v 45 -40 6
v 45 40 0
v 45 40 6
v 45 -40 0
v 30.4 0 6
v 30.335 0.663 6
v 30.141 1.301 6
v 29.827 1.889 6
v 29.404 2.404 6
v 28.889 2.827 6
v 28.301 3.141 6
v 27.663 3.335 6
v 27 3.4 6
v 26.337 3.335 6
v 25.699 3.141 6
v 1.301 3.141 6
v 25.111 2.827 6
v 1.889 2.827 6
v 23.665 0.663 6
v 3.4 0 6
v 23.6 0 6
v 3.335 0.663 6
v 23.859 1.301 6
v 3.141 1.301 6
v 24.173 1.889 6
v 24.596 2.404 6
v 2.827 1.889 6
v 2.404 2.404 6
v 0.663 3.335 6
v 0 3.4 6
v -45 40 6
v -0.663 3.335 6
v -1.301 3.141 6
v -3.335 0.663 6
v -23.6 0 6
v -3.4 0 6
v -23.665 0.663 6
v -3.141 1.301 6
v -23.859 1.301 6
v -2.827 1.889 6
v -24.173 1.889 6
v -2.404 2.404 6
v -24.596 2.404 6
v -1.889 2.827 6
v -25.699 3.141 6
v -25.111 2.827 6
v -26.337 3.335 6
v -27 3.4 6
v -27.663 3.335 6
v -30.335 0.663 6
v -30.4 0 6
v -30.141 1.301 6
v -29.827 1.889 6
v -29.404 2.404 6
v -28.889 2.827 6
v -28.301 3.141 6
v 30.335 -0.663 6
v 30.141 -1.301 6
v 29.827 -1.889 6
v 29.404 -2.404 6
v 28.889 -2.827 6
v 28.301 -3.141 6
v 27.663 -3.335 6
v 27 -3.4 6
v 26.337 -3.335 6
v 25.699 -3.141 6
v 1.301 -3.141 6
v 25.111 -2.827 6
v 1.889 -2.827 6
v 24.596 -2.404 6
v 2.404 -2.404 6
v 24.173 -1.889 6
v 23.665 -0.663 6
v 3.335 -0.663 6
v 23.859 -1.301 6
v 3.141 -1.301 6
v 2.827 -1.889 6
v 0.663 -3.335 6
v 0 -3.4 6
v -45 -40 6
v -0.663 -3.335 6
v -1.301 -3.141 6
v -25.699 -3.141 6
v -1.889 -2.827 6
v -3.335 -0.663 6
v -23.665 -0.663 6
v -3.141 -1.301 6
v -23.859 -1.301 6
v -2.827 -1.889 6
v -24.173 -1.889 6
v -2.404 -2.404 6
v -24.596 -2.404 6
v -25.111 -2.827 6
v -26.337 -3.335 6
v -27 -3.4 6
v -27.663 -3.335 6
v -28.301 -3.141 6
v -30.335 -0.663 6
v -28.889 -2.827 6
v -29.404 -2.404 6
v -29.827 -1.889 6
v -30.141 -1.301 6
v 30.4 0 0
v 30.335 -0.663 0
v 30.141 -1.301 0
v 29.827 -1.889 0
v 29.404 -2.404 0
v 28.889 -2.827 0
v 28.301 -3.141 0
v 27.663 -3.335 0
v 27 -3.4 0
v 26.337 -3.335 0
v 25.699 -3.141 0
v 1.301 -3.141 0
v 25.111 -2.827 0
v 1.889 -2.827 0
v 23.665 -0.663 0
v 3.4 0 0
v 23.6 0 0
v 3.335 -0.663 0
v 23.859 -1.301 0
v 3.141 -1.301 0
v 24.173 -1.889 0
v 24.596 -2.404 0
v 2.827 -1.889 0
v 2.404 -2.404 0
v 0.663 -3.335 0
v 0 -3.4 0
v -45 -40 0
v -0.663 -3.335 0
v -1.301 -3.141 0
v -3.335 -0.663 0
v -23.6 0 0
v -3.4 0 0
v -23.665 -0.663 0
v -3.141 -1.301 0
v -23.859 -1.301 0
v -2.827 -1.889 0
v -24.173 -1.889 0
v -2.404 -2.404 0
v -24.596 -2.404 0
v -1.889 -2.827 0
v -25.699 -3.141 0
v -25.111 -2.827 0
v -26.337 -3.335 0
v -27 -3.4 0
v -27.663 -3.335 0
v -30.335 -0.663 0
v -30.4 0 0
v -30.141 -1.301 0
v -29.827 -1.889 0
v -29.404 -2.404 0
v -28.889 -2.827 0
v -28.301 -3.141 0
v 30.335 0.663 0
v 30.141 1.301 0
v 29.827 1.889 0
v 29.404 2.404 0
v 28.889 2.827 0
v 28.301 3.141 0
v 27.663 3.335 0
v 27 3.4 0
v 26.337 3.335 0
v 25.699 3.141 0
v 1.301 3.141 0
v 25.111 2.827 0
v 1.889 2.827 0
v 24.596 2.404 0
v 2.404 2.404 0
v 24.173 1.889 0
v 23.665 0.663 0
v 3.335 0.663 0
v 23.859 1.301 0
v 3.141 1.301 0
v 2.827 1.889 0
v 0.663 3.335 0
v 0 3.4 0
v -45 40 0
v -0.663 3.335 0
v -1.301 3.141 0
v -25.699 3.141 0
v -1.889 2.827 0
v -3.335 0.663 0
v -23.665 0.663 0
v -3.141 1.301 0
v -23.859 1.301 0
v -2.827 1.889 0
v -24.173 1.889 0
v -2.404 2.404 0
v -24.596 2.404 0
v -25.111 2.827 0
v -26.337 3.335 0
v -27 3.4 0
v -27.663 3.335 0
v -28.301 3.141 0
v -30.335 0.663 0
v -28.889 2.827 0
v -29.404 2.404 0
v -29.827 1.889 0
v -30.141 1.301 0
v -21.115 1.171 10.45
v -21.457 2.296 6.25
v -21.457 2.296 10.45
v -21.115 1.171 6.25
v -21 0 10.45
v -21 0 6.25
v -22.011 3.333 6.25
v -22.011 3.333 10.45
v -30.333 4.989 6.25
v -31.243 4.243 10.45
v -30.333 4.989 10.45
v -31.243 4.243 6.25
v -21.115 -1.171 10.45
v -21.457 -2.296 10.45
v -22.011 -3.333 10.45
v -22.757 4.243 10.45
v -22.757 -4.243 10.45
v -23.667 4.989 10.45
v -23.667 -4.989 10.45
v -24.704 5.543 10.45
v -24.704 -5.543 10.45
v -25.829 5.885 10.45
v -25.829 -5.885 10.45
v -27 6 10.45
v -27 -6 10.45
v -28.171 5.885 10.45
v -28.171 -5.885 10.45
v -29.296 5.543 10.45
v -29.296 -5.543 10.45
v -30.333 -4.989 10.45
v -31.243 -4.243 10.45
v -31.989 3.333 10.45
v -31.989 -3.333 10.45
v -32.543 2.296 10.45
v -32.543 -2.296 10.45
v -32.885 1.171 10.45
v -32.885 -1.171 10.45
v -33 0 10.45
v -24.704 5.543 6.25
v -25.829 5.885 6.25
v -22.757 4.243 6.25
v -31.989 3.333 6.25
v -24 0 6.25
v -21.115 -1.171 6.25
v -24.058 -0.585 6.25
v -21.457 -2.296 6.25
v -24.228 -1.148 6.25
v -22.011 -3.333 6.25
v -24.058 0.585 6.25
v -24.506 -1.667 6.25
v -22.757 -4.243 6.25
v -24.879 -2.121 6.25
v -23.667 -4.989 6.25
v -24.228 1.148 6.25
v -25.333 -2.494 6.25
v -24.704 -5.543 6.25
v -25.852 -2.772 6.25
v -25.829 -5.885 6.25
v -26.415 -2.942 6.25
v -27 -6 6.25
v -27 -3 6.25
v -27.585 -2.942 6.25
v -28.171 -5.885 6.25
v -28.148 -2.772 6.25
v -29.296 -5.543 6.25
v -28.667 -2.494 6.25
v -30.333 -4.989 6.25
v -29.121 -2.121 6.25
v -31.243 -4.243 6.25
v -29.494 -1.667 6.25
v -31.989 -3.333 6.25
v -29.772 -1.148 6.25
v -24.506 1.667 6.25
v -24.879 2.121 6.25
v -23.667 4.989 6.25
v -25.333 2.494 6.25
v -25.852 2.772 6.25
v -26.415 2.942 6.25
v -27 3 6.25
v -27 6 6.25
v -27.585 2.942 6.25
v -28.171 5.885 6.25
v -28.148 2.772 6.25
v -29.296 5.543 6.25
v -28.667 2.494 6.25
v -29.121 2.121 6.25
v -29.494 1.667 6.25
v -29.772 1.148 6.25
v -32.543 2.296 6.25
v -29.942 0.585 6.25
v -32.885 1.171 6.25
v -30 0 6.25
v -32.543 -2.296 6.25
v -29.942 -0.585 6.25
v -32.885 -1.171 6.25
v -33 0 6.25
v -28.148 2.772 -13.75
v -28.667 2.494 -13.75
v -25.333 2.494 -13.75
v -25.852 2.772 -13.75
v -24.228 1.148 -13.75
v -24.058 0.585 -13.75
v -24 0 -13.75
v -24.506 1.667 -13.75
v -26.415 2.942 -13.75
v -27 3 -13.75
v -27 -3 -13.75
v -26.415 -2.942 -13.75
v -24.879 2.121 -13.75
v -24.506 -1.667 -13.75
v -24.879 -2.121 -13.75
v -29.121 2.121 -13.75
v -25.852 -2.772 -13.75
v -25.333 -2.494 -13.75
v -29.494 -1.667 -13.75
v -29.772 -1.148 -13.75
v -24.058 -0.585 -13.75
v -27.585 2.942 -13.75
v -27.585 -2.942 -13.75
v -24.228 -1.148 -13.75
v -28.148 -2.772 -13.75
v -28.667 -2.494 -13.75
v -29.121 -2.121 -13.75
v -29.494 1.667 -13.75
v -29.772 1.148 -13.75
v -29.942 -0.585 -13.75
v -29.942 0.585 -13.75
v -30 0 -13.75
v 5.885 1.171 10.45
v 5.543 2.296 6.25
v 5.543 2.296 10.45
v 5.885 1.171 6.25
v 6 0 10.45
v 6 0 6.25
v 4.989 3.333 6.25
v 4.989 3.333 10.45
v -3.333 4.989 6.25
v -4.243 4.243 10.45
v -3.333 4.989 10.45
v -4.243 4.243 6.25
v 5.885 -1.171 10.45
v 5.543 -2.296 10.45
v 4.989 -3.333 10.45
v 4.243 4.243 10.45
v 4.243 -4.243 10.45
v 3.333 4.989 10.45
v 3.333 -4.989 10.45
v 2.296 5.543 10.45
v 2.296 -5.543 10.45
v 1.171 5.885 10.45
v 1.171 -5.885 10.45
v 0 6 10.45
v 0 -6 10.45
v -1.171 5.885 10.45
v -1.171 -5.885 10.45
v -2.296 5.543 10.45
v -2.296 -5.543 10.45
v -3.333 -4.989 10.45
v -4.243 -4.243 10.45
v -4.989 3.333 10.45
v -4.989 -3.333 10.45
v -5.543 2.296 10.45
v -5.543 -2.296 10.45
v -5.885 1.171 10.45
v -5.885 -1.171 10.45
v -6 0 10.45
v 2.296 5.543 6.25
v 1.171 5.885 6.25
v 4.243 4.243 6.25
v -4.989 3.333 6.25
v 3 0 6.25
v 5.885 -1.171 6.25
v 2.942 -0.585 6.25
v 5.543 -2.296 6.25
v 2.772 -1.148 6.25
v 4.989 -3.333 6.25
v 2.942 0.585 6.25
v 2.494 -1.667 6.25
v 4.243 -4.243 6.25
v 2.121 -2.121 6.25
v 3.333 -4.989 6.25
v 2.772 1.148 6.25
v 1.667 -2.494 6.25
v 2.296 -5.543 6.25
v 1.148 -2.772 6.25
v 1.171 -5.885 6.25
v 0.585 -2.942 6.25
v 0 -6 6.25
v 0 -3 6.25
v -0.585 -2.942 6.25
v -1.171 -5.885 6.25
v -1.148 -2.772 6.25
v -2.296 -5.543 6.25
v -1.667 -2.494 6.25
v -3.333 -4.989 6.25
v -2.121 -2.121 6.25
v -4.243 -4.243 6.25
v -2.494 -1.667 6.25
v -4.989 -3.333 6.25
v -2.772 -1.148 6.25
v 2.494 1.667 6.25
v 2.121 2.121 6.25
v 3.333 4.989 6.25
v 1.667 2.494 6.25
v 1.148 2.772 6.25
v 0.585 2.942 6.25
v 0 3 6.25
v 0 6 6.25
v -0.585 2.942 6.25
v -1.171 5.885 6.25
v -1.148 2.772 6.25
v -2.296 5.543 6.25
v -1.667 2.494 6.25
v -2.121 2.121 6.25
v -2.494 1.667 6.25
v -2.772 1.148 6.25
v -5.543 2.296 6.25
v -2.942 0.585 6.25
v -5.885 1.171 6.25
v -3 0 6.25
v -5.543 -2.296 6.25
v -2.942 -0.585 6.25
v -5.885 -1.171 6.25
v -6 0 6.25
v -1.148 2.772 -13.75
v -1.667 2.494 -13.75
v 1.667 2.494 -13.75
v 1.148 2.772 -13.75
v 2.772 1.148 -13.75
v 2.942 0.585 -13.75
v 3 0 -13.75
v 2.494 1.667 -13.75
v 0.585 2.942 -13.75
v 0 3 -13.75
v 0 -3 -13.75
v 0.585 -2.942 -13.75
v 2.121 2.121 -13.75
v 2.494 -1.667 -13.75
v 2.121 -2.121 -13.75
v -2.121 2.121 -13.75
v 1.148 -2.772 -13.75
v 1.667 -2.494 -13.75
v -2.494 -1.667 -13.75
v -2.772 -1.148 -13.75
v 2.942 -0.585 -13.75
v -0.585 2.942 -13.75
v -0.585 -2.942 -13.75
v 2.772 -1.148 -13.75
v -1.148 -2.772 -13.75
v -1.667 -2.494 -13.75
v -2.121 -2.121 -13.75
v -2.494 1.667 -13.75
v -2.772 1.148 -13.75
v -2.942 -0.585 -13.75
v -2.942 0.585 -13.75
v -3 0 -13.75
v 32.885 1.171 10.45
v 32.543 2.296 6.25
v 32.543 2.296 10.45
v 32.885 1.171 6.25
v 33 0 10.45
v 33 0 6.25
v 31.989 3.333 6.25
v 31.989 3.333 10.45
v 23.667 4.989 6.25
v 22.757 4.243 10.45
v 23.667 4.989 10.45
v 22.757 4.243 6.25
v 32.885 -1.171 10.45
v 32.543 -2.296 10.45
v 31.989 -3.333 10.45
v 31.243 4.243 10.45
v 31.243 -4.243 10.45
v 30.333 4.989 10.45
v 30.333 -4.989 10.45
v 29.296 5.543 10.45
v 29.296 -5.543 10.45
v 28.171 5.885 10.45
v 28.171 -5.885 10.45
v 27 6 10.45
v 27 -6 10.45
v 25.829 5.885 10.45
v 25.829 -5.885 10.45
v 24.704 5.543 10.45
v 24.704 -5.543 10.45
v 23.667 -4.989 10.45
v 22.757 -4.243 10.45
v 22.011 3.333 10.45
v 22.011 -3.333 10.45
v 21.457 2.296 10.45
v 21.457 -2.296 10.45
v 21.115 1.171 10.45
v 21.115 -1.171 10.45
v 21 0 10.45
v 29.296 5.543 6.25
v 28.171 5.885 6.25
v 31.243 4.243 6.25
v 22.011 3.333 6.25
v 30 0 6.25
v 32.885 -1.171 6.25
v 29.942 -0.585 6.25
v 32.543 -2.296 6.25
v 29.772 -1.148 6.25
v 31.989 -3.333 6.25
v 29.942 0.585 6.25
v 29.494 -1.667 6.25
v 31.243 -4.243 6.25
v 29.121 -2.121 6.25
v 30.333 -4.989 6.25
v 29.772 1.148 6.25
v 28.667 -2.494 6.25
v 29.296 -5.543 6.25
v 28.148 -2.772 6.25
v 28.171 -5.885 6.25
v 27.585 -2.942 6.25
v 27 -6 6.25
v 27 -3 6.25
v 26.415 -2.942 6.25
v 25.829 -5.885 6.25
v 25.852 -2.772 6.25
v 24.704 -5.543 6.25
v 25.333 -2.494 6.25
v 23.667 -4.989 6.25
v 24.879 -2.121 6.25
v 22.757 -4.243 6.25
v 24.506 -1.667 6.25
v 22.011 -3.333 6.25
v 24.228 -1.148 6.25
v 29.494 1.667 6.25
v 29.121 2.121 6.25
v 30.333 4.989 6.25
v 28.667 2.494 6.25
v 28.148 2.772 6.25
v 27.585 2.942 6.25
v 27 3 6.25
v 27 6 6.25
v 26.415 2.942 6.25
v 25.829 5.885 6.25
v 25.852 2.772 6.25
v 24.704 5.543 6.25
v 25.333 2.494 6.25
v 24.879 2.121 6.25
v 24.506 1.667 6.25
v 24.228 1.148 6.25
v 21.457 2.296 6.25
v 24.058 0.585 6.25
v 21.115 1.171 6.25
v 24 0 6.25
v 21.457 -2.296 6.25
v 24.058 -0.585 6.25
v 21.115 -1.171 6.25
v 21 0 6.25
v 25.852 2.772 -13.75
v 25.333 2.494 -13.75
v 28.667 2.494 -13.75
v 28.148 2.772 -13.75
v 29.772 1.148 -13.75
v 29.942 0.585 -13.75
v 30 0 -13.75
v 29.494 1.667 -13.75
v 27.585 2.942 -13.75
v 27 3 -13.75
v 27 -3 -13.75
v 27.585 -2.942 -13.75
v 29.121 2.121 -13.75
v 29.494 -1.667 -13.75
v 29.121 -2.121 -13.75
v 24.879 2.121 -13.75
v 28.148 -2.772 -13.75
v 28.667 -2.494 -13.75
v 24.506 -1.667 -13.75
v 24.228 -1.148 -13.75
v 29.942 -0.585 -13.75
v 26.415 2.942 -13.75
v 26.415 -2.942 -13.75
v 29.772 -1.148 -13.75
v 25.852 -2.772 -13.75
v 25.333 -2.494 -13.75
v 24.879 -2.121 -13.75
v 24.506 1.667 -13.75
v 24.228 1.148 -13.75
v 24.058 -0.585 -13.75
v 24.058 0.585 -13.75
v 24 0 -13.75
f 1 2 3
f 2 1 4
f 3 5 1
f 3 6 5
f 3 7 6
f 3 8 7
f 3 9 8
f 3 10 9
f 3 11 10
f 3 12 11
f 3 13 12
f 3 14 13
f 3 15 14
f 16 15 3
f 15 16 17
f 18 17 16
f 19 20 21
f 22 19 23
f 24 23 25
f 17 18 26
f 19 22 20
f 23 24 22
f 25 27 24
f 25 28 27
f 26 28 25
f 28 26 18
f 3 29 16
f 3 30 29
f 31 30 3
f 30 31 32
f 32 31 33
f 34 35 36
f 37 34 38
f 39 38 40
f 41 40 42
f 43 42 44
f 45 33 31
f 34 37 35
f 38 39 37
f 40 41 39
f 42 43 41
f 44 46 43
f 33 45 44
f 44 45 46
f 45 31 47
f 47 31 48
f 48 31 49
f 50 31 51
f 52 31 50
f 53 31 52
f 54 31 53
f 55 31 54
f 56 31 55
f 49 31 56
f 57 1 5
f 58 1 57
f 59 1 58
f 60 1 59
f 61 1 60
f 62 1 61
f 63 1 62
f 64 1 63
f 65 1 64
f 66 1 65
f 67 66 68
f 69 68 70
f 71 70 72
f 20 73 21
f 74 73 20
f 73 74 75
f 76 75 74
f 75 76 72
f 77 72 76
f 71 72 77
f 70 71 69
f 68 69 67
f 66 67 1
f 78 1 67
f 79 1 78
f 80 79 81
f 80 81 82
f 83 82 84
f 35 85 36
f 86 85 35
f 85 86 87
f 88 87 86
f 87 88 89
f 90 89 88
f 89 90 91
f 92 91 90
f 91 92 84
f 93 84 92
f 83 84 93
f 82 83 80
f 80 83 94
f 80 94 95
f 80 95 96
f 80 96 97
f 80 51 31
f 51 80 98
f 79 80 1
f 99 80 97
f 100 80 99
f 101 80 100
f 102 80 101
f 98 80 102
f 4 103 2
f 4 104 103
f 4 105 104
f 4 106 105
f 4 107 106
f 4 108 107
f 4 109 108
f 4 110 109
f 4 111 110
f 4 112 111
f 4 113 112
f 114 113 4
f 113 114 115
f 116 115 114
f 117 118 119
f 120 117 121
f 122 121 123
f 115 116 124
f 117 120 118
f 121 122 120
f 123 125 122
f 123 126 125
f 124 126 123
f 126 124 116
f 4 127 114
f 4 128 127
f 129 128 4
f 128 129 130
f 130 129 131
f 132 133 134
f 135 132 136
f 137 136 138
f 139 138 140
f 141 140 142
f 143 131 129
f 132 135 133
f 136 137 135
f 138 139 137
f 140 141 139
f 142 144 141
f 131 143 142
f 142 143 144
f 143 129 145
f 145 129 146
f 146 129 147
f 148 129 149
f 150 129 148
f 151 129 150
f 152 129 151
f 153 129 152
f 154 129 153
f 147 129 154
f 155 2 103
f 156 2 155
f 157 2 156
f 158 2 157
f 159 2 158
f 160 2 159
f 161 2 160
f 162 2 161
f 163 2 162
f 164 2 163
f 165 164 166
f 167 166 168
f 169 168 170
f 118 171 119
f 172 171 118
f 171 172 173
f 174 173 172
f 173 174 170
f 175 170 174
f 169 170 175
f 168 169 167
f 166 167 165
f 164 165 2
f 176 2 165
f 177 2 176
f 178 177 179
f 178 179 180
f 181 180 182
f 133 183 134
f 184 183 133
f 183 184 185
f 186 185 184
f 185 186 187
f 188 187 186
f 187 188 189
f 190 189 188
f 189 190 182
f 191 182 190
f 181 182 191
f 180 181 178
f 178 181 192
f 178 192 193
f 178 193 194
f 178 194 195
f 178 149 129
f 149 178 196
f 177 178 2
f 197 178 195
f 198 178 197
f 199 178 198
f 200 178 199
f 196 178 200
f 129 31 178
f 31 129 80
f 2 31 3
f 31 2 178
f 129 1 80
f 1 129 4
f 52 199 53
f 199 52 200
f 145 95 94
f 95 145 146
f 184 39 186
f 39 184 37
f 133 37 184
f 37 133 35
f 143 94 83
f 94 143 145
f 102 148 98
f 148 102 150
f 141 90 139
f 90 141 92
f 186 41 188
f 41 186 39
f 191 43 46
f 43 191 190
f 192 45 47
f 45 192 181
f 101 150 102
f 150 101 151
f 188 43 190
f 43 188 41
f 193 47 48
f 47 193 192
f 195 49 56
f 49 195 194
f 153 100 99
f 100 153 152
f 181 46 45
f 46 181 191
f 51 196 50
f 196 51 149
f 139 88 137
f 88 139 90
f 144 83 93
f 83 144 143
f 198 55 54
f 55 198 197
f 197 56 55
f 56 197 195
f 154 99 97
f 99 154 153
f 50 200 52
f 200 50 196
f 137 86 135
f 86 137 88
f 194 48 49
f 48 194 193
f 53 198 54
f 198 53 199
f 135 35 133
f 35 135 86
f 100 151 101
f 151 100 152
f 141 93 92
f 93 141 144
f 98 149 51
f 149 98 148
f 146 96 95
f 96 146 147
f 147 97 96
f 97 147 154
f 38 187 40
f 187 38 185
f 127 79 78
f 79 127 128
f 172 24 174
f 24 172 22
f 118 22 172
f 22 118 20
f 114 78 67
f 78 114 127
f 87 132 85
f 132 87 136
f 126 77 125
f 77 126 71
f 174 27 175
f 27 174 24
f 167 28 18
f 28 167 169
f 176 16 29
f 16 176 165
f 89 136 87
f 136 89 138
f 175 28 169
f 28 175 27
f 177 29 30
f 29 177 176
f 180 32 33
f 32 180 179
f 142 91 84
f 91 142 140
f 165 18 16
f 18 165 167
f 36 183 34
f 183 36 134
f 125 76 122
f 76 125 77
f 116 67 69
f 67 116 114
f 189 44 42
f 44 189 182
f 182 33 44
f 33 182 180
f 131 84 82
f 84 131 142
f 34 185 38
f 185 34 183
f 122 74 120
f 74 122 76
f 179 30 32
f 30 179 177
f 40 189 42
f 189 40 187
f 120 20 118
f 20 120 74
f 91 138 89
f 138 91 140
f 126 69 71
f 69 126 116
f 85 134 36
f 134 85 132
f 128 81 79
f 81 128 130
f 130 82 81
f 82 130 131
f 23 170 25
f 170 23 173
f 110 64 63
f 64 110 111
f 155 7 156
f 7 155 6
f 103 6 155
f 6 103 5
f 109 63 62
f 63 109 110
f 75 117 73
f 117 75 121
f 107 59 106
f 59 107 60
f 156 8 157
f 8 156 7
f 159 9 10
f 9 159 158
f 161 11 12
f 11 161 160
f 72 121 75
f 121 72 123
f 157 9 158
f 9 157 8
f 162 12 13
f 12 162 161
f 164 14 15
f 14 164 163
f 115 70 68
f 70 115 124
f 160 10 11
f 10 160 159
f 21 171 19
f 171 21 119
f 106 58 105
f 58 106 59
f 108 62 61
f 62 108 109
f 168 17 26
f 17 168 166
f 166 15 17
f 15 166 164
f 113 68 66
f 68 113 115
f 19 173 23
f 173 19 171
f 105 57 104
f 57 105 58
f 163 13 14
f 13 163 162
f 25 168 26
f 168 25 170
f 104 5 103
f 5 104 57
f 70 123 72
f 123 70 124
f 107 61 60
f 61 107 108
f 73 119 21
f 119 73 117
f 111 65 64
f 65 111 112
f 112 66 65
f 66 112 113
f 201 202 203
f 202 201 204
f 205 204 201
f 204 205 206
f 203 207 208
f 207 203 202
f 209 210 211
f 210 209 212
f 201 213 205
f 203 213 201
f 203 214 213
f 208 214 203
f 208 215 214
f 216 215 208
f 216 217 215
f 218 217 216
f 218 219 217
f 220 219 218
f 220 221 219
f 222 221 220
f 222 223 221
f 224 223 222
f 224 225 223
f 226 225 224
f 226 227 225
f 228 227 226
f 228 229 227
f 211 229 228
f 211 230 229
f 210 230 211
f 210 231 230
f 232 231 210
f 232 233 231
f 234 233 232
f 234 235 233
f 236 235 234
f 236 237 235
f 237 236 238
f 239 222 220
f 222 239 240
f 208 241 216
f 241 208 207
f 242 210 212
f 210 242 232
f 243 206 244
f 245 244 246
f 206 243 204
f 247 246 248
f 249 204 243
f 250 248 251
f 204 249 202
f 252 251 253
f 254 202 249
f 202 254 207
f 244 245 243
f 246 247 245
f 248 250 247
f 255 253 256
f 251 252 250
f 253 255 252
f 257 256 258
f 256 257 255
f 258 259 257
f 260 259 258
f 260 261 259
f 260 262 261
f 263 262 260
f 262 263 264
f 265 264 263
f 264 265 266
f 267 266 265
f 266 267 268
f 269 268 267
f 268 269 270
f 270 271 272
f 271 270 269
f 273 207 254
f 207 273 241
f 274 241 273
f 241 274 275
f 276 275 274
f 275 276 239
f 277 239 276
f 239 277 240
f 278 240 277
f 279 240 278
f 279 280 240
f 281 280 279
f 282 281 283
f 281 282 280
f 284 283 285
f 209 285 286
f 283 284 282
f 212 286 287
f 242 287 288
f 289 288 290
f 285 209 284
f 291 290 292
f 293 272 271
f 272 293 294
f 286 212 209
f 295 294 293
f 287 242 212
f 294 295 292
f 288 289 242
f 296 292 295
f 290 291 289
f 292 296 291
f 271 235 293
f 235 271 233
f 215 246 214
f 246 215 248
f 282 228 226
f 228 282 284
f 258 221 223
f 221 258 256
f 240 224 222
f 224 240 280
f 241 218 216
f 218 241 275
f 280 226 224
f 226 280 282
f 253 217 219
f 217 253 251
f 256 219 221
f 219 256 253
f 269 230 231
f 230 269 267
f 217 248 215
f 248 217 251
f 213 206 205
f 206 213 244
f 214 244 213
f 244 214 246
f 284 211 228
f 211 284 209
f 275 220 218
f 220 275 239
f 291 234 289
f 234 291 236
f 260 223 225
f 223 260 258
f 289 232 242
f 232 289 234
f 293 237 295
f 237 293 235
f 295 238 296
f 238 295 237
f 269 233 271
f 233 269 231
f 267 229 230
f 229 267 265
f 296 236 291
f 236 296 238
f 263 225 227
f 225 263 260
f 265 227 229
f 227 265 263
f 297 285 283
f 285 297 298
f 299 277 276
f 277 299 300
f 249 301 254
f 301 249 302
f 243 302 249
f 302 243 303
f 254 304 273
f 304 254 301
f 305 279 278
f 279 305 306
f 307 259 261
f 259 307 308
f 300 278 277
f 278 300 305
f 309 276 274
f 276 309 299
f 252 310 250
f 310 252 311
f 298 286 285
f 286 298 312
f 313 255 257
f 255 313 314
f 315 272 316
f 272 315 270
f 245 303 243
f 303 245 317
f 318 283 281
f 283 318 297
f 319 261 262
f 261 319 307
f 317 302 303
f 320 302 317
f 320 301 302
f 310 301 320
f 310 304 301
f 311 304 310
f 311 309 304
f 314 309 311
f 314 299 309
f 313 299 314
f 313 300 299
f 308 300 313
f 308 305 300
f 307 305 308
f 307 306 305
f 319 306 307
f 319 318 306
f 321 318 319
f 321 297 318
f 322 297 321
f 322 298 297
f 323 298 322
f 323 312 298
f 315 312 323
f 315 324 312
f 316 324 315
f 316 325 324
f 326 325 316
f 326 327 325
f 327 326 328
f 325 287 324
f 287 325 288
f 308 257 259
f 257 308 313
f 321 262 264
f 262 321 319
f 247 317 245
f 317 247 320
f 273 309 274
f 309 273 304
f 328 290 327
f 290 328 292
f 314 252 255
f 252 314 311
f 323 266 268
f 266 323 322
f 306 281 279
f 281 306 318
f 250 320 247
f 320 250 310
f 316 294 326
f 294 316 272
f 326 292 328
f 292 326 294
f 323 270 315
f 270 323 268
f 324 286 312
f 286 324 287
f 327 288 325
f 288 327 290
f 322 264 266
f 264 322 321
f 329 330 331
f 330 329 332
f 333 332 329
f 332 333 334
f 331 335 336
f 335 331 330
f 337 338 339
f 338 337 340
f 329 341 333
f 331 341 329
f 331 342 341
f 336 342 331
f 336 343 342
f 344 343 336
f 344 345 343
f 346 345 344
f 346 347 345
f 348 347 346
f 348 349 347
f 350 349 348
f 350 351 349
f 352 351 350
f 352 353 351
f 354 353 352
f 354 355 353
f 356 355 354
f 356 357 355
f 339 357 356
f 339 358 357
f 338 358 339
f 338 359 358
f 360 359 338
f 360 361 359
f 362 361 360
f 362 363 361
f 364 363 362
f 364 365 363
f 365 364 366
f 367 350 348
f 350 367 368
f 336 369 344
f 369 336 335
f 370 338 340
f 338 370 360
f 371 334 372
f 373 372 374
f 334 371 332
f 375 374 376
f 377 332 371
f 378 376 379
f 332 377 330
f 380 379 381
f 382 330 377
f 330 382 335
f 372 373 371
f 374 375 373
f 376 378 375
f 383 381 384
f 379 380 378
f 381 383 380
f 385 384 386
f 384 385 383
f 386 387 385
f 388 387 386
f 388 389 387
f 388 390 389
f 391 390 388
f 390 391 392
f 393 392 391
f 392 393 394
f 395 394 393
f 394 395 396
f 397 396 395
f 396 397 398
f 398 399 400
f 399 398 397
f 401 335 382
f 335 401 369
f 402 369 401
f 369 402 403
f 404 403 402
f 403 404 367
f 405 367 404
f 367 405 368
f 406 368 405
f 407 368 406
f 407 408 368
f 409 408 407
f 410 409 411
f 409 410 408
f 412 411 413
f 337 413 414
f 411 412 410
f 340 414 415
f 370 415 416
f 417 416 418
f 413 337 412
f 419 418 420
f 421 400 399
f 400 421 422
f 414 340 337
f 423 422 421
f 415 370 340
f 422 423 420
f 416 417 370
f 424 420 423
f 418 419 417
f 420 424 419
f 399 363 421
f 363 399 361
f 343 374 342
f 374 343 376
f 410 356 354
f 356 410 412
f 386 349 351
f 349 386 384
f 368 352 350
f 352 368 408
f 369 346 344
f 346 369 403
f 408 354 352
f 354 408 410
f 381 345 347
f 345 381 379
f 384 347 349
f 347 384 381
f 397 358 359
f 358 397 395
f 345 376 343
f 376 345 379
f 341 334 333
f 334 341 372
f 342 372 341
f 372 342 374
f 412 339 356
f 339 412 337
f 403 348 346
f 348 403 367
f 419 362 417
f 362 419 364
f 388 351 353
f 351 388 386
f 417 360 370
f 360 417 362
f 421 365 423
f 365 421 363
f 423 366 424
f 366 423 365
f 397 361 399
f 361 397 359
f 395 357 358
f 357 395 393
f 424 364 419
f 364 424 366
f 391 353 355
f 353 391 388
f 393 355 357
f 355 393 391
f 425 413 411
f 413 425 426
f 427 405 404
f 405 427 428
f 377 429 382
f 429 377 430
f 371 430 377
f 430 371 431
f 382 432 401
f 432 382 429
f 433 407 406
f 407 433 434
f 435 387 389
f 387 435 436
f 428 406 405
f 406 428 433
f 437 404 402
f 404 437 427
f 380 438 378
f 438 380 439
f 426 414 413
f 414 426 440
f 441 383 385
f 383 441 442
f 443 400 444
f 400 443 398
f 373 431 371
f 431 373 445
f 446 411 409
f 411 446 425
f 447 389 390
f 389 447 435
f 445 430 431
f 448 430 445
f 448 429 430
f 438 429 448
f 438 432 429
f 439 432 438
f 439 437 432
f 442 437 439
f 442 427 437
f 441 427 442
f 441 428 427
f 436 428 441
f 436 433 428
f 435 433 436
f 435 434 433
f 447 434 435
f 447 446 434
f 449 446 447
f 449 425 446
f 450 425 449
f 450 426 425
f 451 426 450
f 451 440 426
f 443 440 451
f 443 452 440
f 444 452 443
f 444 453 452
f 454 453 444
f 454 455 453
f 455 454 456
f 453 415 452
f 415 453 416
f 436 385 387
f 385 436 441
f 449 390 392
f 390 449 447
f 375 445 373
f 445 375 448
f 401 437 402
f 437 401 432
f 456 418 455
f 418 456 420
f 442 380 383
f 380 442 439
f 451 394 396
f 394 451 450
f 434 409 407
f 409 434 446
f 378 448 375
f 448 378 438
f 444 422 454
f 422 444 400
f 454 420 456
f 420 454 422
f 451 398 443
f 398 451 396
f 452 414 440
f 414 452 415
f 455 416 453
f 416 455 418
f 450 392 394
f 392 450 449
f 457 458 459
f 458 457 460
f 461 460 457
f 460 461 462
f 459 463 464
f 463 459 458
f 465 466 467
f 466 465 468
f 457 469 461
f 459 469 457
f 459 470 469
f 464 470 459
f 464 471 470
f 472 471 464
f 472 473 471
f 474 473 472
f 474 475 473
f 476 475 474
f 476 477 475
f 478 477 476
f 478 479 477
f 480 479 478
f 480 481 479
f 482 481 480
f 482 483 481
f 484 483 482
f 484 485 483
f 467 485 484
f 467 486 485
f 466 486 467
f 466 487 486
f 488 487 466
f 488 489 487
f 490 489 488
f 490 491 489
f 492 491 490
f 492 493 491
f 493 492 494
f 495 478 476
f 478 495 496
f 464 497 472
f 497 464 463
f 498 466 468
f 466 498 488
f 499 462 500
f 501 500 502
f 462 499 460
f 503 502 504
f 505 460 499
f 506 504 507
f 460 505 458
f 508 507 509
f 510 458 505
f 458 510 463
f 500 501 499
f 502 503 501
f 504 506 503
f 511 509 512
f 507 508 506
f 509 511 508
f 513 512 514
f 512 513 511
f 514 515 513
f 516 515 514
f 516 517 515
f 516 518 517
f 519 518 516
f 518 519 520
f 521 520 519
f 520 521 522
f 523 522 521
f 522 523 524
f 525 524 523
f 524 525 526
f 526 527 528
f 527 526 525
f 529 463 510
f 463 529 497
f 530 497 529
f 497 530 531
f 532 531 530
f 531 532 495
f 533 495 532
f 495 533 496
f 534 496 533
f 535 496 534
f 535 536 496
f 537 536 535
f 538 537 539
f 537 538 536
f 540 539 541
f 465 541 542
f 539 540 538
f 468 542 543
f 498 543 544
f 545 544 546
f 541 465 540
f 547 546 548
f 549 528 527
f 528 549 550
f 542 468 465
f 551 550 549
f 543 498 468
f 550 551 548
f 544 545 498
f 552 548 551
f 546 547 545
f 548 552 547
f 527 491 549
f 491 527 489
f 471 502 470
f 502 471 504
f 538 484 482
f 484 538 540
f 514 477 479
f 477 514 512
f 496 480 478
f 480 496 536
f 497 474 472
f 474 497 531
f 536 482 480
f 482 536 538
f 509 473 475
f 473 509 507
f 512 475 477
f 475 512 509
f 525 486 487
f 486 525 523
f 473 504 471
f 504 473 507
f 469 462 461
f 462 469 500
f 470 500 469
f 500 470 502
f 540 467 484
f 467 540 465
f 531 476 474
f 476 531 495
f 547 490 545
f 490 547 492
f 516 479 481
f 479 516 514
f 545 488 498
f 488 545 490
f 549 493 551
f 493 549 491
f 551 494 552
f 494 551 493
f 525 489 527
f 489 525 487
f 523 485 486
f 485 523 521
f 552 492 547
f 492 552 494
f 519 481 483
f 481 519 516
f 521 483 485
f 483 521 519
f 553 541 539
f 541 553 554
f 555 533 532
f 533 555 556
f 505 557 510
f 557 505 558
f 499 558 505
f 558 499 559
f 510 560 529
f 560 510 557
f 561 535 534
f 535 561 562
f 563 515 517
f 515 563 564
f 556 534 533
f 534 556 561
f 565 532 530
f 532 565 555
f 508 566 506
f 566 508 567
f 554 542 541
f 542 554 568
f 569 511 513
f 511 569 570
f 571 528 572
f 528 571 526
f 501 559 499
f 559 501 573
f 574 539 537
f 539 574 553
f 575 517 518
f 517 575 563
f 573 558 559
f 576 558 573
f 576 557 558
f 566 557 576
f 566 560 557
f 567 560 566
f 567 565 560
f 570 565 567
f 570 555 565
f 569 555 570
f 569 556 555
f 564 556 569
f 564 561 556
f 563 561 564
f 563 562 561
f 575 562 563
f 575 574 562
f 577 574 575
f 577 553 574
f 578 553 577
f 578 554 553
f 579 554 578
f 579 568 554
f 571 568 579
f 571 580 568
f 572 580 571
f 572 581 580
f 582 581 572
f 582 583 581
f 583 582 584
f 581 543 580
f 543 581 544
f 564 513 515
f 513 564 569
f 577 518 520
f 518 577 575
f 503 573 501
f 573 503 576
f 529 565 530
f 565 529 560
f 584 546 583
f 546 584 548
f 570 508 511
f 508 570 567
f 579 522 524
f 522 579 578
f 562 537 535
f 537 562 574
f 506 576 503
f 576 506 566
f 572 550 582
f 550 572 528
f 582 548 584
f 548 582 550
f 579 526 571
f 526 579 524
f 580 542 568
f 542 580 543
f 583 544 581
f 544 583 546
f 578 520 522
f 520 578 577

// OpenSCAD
$fn = 32;

// ------------------------------------------------------------------------
// Bolted plate: 90 x 80 x 6 mm plate, 3 fasteners
// Every part is its own module, assembly() places them once.
// ------------------------------------------------------------------------

// --- part 1 ---
module plate() {
  difference() {
    translate([-45, -40, 0]) cube([90, 80, 6]);
    translate([-27, 0, -1]) cylinder(h = 8, d = 6.8);
    translate([0, 0, -1]) cylinder(h = 8, d = 6.8);
    translate([27, 0, -1]) cylinder(h = 8, d = 6.8);
  }
}

// --- part 2 ---
module bolt1() {
  cylinder(h = 4.2, d = 12);
  translate([0, 0, -20]) cylinder(h = 20, d = 6);
}

// --- part 3 ---
module bolt2() {
  cylinder(h = 4.2, d = 12);
  translate([0, 0, -20]) cylinder(h = 20, d = 6);
}

// --- part 4 ---
module bolt3() {
  cylinder(h = 4.2, d = 12);
  translate([0, 0, -20]) cylinder(h = 20, d = 6);
}

// --- assembly ---
module assembly() {
  translate([0, 0, 0]) rotate([0, 0, 0]) plate();
  translate([-27, 0, 6.25]) rotate([0, 0, 0]) bolt1();
  translate([0, 0, 6.25]) rotate([0, 0, 0]) bolt2();
  translate([27, 0, 6.25]) rotate([0, 0, 0]) bolt3();
}

assembly();
